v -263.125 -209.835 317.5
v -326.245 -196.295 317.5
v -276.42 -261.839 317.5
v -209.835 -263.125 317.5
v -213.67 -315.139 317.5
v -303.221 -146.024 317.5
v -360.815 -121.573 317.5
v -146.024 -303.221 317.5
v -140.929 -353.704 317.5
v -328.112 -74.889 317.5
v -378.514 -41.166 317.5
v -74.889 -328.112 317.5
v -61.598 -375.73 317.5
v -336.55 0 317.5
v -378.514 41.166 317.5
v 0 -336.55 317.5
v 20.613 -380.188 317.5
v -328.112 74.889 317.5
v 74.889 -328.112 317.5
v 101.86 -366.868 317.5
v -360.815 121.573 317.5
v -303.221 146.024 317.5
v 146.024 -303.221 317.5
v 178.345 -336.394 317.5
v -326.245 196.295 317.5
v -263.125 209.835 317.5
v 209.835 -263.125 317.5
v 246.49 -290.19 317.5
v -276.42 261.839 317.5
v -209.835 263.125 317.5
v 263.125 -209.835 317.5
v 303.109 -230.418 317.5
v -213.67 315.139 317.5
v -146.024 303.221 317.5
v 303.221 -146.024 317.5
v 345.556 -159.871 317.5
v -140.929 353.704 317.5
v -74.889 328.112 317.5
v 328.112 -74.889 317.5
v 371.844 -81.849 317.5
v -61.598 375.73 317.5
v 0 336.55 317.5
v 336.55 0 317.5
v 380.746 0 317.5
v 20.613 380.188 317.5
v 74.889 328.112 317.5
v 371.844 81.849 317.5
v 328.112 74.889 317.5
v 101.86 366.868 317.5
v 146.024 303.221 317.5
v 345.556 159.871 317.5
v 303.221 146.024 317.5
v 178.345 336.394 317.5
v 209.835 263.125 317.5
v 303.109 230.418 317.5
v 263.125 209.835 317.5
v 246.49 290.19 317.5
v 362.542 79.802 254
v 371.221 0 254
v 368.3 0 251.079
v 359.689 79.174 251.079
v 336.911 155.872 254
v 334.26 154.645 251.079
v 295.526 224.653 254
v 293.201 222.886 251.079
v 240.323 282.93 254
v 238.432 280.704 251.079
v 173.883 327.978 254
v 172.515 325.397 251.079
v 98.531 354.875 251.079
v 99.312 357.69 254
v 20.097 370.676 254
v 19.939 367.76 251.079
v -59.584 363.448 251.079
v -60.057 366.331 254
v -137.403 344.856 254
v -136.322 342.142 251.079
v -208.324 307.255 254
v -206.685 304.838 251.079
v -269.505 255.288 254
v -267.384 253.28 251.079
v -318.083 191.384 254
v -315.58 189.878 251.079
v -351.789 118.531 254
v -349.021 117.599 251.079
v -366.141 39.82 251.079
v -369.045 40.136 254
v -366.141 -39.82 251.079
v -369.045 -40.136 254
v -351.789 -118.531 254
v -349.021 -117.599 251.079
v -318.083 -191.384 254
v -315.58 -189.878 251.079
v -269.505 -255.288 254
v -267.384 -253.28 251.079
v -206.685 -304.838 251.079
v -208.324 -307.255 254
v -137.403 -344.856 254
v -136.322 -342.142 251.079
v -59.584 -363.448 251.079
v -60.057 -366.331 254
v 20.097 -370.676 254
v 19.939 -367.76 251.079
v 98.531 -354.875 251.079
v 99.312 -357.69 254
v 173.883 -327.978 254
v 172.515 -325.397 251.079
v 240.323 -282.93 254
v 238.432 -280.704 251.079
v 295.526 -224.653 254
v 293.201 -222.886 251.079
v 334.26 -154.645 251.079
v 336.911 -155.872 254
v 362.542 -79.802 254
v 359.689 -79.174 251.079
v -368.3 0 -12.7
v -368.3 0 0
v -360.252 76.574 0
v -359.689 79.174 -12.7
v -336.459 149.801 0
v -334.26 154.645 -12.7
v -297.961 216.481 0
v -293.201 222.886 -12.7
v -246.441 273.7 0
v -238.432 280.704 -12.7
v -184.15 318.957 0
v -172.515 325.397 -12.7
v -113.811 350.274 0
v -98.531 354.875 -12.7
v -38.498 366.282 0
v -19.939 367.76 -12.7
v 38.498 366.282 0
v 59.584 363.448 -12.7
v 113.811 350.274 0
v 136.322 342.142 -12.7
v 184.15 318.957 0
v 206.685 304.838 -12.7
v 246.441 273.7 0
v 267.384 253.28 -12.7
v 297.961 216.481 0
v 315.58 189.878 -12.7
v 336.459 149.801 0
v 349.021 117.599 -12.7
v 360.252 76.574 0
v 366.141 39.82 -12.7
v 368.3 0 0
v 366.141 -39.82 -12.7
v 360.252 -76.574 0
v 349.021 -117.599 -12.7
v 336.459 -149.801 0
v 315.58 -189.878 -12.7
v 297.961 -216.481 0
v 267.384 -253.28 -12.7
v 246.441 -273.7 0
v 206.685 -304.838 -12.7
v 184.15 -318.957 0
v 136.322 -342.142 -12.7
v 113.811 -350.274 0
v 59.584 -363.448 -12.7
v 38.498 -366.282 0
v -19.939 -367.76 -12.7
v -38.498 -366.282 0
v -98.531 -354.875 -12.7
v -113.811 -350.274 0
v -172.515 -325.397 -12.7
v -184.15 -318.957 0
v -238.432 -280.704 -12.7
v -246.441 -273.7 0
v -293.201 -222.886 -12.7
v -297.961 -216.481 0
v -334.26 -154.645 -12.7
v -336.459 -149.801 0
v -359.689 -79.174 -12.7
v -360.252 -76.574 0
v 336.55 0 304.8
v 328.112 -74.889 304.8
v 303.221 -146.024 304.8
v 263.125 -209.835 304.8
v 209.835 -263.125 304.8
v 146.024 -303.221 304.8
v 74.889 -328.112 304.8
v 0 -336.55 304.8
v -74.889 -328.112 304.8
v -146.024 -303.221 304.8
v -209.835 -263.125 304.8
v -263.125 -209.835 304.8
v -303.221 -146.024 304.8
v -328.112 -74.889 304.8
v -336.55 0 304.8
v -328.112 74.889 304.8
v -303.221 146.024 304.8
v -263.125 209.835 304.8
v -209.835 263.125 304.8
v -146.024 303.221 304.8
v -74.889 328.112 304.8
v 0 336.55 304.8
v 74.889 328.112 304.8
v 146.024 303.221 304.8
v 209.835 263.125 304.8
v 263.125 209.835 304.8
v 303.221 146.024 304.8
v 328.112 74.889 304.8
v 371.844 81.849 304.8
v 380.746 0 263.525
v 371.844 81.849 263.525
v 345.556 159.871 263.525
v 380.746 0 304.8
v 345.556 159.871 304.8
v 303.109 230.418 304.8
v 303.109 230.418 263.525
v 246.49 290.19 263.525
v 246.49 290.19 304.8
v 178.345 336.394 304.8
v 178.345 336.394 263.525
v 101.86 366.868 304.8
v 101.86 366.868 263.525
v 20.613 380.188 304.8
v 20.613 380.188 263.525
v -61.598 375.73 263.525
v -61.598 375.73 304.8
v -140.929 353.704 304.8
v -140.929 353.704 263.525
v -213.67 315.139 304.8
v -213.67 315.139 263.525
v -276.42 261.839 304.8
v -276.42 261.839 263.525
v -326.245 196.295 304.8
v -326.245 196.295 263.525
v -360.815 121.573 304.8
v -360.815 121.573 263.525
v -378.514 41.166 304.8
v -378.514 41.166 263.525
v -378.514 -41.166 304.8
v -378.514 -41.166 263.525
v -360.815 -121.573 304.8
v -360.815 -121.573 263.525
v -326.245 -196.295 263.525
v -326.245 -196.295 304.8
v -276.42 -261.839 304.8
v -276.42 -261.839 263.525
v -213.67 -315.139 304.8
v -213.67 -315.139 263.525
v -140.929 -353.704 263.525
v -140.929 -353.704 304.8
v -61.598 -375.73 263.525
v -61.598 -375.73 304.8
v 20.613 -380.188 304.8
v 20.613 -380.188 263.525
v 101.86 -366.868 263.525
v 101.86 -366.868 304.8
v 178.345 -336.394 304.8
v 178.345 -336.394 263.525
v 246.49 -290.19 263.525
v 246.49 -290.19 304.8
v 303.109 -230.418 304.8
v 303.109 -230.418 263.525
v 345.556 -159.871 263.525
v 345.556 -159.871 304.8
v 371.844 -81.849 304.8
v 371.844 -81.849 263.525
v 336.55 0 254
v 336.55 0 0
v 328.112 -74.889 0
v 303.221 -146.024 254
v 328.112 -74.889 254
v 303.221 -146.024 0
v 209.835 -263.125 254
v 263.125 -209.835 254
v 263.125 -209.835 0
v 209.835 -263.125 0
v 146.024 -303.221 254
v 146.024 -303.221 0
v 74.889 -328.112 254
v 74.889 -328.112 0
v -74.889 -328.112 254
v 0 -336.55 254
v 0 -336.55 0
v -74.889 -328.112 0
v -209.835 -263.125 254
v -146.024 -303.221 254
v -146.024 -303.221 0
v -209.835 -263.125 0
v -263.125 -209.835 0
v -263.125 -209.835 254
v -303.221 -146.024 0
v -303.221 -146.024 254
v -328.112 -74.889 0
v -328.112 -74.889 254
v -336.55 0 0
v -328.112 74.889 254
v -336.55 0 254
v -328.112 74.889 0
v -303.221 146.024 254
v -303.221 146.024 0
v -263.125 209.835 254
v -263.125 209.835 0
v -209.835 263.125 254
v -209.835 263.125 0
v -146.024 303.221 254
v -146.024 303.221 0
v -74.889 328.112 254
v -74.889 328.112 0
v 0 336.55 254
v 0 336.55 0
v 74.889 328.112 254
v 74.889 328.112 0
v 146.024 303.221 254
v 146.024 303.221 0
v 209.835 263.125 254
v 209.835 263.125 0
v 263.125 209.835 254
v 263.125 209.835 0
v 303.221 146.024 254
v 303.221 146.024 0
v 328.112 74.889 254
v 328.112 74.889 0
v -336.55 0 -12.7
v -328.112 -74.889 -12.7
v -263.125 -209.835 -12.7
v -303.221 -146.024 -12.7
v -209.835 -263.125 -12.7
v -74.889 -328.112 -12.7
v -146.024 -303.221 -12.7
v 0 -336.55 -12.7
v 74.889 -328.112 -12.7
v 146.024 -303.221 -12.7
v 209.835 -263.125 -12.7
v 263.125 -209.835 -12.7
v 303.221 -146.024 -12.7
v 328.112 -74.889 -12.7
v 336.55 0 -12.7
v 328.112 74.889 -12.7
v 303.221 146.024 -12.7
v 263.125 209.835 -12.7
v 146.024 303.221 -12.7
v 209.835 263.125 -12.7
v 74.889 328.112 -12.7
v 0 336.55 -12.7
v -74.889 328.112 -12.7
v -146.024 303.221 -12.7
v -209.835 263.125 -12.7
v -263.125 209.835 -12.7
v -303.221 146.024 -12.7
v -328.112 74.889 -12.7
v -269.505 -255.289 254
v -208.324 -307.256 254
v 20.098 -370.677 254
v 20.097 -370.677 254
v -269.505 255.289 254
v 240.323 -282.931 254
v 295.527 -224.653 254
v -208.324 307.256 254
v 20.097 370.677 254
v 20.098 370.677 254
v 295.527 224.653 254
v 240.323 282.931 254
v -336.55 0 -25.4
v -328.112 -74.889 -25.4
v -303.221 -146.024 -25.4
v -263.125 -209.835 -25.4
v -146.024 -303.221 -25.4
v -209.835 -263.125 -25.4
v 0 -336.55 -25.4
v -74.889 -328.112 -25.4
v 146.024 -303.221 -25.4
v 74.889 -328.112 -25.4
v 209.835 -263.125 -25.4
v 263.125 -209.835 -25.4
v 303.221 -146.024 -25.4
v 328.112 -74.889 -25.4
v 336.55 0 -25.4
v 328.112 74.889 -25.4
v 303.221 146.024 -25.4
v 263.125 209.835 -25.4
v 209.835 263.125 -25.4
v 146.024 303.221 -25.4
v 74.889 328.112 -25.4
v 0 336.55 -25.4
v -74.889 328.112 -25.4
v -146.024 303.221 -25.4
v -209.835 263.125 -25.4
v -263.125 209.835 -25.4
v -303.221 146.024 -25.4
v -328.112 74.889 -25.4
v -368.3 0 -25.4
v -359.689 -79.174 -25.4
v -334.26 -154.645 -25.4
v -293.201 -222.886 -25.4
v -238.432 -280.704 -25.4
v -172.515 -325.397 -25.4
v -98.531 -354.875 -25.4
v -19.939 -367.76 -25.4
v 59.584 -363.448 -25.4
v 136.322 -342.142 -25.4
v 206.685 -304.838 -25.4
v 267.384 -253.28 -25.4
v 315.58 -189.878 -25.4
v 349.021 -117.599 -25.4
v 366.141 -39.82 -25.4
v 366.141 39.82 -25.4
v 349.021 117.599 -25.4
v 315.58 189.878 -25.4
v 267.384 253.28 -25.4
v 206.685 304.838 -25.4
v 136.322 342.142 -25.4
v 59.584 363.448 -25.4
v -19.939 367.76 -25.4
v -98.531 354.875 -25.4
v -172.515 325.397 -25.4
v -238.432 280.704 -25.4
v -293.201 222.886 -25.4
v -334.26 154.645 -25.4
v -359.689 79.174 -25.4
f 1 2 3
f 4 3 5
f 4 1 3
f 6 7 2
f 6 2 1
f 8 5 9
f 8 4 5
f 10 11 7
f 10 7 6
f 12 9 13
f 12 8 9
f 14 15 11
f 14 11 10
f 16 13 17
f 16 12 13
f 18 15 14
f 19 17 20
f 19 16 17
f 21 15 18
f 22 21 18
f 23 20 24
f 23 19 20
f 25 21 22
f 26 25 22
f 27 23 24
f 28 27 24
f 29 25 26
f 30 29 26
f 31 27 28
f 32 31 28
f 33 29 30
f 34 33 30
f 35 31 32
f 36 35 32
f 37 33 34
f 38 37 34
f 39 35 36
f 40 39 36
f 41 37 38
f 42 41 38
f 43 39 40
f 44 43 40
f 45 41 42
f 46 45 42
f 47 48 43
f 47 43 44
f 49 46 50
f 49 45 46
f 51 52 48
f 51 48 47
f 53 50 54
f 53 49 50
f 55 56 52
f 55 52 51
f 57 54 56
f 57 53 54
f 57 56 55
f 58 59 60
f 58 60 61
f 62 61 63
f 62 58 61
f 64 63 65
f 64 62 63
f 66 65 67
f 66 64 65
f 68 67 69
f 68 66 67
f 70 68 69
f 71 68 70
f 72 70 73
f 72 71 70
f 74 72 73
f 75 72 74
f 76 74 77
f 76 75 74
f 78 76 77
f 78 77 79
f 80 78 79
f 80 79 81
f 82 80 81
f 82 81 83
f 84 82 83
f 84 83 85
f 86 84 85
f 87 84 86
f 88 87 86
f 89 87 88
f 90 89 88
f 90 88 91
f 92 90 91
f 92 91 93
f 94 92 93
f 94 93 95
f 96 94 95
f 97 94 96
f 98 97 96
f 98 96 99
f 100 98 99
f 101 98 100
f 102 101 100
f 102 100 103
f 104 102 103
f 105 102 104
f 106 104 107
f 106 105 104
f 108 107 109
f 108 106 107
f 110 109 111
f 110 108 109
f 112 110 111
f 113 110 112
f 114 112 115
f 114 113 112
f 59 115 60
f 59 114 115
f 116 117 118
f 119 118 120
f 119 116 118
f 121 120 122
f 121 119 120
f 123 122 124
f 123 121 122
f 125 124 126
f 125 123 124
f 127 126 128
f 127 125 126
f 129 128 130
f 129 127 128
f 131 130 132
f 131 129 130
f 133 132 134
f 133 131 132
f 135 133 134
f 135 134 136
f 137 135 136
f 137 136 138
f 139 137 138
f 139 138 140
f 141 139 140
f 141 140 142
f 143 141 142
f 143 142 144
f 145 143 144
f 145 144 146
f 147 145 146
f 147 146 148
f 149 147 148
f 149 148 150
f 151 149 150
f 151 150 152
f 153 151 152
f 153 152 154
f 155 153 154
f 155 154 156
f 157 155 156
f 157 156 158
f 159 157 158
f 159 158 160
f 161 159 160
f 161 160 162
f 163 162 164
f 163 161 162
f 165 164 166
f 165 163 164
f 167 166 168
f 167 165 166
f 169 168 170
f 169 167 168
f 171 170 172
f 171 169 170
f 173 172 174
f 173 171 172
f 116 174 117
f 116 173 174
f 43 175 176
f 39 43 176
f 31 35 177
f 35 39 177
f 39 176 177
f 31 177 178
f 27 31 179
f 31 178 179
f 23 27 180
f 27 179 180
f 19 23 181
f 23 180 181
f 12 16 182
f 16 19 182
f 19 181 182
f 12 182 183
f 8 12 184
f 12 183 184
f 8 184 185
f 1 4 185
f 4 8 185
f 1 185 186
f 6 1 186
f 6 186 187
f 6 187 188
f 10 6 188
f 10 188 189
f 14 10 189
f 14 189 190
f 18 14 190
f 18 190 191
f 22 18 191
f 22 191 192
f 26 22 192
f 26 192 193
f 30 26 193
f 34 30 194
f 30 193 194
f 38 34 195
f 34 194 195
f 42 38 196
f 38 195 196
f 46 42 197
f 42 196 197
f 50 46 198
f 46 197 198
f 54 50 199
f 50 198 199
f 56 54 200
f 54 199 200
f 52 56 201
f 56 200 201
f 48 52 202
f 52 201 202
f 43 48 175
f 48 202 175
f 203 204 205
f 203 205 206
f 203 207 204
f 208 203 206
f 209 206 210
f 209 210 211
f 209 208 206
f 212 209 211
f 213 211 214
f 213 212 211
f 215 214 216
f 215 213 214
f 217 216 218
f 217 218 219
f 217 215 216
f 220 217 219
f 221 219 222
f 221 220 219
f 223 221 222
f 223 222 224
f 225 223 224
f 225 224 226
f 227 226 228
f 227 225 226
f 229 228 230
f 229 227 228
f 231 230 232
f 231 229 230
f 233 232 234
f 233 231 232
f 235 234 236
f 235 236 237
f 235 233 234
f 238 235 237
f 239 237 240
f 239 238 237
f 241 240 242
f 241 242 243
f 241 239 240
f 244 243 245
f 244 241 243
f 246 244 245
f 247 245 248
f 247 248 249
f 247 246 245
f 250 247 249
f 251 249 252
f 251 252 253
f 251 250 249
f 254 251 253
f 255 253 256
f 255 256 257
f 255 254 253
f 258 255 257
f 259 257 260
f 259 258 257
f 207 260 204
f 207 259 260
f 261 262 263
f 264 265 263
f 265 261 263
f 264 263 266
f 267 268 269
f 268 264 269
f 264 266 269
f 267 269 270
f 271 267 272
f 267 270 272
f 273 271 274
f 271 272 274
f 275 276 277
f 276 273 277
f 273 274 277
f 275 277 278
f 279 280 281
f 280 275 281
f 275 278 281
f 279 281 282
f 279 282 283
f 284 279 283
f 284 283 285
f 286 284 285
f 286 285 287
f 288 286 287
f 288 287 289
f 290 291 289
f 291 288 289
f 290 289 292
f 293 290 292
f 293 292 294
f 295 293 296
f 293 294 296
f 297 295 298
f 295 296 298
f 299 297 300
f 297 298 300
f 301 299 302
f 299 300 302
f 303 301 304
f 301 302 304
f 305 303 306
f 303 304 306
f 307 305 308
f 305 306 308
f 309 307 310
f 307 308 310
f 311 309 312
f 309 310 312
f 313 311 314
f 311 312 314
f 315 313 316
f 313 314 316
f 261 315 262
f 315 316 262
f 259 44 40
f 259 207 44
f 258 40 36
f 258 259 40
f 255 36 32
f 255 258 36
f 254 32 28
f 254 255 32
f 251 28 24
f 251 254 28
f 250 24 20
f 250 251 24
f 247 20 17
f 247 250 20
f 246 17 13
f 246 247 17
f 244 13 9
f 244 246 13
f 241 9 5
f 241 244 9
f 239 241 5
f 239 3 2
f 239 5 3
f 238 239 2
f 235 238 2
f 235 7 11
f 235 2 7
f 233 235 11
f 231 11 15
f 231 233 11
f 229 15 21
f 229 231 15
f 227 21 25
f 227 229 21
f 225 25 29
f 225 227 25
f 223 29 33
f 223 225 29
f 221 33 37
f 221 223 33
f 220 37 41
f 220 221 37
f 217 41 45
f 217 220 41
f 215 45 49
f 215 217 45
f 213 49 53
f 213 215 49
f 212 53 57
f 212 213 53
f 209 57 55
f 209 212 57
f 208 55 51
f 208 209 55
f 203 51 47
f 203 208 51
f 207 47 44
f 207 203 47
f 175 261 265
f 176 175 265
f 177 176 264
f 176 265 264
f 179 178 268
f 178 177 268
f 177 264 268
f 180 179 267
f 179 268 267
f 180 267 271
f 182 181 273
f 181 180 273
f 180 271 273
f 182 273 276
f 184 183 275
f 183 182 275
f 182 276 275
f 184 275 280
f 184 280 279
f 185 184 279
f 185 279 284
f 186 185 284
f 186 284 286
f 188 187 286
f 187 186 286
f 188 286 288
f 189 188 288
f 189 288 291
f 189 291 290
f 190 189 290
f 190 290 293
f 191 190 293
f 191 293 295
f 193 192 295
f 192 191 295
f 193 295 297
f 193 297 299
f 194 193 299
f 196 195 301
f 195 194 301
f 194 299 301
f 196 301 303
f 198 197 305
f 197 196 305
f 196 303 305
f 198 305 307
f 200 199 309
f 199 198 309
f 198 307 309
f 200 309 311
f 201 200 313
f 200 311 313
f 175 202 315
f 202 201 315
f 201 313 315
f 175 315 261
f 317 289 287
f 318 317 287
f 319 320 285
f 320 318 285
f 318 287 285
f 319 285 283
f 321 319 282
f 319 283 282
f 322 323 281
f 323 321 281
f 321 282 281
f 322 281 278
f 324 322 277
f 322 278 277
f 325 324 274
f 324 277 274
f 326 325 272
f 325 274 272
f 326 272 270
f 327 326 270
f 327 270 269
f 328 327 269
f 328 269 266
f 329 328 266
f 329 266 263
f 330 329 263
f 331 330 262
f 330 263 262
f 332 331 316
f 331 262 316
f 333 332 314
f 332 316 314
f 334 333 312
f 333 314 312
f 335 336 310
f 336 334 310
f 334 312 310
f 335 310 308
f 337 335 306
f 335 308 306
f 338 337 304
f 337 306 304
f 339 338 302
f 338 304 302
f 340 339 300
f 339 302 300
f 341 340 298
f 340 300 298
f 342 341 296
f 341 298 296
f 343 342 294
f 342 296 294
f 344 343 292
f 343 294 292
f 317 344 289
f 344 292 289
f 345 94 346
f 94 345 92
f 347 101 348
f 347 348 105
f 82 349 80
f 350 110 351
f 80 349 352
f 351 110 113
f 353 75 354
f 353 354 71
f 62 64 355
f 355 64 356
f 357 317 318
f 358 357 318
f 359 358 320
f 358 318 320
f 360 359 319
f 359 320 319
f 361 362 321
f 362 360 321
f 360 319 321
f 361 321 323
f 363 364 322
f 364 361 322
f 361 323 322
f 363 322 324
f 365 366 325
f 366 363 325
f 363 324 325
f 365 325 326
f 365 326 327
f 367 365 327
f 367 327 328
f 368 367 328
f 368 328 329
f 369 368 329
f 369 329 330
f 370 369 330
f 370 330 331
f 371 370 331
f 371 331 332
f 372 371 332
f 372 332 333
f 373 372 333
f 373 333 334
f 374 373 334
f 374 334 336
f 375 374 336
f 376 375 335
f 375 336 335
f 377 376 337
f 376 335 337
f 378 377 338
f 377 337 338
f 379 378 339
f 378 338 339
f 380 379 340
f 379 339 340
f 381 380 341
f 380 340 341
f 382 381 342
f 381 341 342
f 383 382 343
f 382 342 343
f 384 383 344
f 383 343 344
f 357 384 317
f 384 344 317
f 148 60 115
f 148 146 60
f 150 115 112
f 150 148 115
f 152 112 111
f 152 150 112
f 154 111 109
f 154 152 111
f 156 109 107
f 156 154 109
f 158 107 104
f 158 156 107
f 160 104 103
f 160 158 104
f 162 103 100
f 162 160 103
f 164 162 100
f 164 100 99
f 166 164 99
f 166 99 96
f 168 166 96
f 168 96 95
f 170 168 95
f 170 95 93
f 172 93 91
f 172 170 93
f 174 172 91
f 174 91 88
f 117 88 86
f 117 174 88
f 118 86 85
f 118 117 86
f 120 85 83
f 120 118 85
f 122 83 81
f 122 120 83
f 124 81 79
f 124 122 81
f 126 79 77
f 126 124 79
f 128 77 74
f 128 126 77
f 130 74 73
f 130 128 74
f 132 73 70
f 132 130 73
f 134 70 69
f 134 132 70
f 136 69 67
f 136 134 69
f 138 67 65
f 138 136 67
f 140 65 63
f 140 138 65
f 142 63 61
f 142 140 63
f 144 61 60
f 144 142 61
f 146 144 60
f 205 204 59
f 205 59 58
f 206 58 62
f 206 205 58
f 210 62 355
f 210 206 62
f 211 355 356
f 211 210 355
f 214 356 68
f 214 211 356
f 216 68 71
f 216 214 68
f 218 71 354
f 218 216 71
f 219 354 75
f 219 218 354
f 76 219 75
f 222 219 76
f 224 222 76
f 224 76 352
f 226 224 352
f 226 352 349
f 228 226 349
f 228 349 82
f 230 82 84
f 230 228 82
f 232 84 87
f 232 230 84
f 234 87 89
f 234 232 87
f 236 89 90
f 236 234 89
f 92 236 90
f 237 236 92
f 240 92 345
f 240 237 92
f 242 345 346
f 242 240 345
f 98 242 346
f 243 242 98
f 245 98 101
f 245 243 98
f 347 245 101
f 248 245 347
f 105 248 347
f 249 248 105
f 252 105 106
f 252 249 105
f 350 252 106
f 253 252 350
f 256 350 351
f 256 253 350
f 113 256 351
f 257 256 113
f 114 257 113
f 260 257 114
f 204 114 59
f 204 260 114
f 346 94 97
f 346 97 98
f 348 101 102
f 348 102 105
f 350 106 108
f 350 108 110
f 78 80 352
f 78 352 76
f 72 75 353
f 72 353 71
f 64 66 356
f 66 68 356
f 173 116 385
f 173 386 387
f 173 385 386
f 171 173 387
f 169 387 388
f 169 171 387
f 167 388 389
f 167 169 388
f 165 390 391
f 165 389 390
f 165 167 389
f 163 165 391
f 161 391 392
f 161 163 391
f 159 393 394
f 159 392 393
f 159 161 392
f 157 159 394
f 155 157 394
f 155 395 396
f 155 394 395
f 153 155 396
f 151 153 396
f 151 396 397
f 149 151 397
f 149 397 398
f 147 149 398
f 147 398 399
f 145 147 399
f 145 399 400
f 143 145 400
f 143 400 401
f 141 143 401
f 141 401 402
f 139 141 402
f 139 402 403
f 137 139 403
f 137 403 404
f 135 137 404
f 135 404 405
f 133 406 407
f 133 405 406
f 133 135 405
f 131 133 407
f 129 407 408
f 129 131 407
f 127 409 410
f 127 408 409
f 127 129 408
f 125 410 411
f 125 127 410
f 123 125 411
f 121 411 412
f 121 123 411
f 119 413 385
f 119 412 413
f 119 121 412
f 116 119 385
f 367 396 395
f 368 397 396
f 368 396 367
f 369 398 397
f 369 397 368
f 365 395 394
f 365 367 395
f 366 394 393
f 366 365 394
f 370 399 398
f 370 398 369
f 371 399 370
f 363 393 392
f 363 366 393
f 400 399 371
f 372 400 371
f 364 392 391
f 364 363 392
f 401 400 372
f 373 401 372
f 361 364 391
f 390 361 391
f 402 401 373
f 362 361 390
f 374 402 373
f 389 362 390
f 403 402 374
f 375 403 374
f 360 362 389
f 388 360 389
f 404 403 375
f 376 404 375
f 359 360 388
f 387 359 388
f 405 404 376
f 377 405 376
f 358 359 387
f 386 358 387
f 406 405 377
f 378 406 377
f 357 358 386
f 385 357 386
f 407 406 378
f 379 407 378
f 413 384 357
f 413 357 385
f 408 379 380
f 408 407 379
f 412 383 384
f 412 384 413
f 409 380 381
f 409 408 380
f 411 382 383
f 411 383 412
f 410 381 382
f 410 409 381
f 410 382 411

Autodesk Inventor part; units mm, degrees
ref_plane "YZ Plane" through (0, 0, 0) normal (1, 0, 0) x (0, 1, 0)
ref_plane "XZ Plane" through (0, 0, 0) normal (0, 1, 0) x (-1, 0, 0)
ref_plane "XY Plane" through (0, 0, 0) normal (0, 0, 1) x (1, 0, 0)
sketch "Sketch1" plane through (0, 0, 0) normal (0, 0, 1) x (1, 0, 0)
  circle A0 centre (0, 0) radius 336.55
  circle A1 centre (0, 0) radius 368.3
  dimension "d0" = 673.1
  dimension "d1" = 736.6
extrude "Extrusion1" add sketch "Sketch1" along normal blind 304.8
sketch "Sketch2" plane through (0, 0, 304.8) normal (0, 0, 1) x (1, 0, 0)
  circle A0 centre (0, 0) radius 368.3 projected
  circle A1 centre (0, 0) radius 371.221
  circle A2 centre (0, 0) radius 374.396
  dimension "d4" = 742.442
  dimension "d5" = 748.792
extrude "Extrusion2" add sketch "Sketch2" against normal blind 50.8 contours A1
extrude "Extrusion3" add sketch "Sketch2" against normal blind 25.4 contours A2
chamfer "Chamfer1" distance 2.921 angle 45 1 edges at (-368.3, 0, 254)
sketch "Sketch3" plane through (0, 0, 0) normal (0, 0, -1) x (-1, 0, 0)
  circle A0 centre (0, 0) radius 355.346
  circle A1 centre (0, 0) radius 336.55 projected
  dimension "d13" = 710.692
extrude "Extrusion4" add sketch "Sketch3" along normal blind 12.7
fillet "Fillet1" radius 0.7937 2 edges at (355.346, 0, 0) (-371.221, 0, 279.4)
chamfer "Chamfer2" distance 0.7937 angle 45 1 edges at (355.346, 0, -12.7)
chamfer "Chamfer3" distance 0.7937 angle 45 1 edges at (-374.396, 0, 279.4)
sketch "Sketch4" plane through (0, 0, 0) normal (1, 0, 0) x (0, 1, 0)
  line L0 (371.221, 278.6063) -> (371.221, 254) construction
  line L1 (-374.396, 304.8) -> (374.396, 304.8) construction
  line L2 (371.221, 273.05) -> (369.4409, 271.2699)
  arc A0 (369.4409, 271.2699) -> (368.046, 267.9023) centre (372.8085, 267.9023) ccw
  line L3 (368.046, 267.9023) -> (368.046, 267.0852)
  arc A1 (368.046, 267.0852) -> (369.4409, 263.7176) centre (372.8085, 267.0852) ccw
  line L4 (369.4409, 263.7176) -> (371.221, 261.9375)
  line L5 (371.221, 261.9375) -> (371.221, 273.05)
  line L6 (0, -76.2) -> (0, 368.3) projected
  point P0 (0, 0)
  dimension "d23" = 11.1125
  dimension "d24" = 3.175
  dimension "d25" = 4.7625
  dimension "d26" = 31.75
  dimension "d27" = 45
revolve "Revolution1" cut sketch "Sketch4" angle 360 about axis through (0, 0, -10) along (0, 0, 1)
sketch "Sketch5" plane through (0, 0, -12.7) normal (0, 0, -1) x (-1, 0, 0)
  circle A0 centre (0, 0) radius 336.55 projected
  circle A1 centre (0, 0) radius 368.3 projected
extrude "Extrusion5" add sketch "Sketch5" along normal blind 12.7 and the other way blind 12.7
sketch "Sketch6" plane through (0, 0, 304.8) normal (0, 0, 1) x (1, 0, 0)
  circle A0 centre (0, 0) radius 374.396 projected
  circle A1 centre (0, 0) radius 336.55 projected
  circle A2 centre (0, 0) radius 380.746
  dimension "d33" = 6.35
extrude "Extrusion6" add sketch "Sketch6" along normal blind 12.7 and the other way blind 50.8 contours A0 | A2
chamfer "Chamfer6" distance 9.525 angle 45 1 edges at (-380.746, 0, 254)
equation "\"d10\" = -0.5 * d1 + 0.5 * d4"
properties part number "A1-19037-100-06 HCWI liner - pup - as cast" material "Iron, HCWI"
